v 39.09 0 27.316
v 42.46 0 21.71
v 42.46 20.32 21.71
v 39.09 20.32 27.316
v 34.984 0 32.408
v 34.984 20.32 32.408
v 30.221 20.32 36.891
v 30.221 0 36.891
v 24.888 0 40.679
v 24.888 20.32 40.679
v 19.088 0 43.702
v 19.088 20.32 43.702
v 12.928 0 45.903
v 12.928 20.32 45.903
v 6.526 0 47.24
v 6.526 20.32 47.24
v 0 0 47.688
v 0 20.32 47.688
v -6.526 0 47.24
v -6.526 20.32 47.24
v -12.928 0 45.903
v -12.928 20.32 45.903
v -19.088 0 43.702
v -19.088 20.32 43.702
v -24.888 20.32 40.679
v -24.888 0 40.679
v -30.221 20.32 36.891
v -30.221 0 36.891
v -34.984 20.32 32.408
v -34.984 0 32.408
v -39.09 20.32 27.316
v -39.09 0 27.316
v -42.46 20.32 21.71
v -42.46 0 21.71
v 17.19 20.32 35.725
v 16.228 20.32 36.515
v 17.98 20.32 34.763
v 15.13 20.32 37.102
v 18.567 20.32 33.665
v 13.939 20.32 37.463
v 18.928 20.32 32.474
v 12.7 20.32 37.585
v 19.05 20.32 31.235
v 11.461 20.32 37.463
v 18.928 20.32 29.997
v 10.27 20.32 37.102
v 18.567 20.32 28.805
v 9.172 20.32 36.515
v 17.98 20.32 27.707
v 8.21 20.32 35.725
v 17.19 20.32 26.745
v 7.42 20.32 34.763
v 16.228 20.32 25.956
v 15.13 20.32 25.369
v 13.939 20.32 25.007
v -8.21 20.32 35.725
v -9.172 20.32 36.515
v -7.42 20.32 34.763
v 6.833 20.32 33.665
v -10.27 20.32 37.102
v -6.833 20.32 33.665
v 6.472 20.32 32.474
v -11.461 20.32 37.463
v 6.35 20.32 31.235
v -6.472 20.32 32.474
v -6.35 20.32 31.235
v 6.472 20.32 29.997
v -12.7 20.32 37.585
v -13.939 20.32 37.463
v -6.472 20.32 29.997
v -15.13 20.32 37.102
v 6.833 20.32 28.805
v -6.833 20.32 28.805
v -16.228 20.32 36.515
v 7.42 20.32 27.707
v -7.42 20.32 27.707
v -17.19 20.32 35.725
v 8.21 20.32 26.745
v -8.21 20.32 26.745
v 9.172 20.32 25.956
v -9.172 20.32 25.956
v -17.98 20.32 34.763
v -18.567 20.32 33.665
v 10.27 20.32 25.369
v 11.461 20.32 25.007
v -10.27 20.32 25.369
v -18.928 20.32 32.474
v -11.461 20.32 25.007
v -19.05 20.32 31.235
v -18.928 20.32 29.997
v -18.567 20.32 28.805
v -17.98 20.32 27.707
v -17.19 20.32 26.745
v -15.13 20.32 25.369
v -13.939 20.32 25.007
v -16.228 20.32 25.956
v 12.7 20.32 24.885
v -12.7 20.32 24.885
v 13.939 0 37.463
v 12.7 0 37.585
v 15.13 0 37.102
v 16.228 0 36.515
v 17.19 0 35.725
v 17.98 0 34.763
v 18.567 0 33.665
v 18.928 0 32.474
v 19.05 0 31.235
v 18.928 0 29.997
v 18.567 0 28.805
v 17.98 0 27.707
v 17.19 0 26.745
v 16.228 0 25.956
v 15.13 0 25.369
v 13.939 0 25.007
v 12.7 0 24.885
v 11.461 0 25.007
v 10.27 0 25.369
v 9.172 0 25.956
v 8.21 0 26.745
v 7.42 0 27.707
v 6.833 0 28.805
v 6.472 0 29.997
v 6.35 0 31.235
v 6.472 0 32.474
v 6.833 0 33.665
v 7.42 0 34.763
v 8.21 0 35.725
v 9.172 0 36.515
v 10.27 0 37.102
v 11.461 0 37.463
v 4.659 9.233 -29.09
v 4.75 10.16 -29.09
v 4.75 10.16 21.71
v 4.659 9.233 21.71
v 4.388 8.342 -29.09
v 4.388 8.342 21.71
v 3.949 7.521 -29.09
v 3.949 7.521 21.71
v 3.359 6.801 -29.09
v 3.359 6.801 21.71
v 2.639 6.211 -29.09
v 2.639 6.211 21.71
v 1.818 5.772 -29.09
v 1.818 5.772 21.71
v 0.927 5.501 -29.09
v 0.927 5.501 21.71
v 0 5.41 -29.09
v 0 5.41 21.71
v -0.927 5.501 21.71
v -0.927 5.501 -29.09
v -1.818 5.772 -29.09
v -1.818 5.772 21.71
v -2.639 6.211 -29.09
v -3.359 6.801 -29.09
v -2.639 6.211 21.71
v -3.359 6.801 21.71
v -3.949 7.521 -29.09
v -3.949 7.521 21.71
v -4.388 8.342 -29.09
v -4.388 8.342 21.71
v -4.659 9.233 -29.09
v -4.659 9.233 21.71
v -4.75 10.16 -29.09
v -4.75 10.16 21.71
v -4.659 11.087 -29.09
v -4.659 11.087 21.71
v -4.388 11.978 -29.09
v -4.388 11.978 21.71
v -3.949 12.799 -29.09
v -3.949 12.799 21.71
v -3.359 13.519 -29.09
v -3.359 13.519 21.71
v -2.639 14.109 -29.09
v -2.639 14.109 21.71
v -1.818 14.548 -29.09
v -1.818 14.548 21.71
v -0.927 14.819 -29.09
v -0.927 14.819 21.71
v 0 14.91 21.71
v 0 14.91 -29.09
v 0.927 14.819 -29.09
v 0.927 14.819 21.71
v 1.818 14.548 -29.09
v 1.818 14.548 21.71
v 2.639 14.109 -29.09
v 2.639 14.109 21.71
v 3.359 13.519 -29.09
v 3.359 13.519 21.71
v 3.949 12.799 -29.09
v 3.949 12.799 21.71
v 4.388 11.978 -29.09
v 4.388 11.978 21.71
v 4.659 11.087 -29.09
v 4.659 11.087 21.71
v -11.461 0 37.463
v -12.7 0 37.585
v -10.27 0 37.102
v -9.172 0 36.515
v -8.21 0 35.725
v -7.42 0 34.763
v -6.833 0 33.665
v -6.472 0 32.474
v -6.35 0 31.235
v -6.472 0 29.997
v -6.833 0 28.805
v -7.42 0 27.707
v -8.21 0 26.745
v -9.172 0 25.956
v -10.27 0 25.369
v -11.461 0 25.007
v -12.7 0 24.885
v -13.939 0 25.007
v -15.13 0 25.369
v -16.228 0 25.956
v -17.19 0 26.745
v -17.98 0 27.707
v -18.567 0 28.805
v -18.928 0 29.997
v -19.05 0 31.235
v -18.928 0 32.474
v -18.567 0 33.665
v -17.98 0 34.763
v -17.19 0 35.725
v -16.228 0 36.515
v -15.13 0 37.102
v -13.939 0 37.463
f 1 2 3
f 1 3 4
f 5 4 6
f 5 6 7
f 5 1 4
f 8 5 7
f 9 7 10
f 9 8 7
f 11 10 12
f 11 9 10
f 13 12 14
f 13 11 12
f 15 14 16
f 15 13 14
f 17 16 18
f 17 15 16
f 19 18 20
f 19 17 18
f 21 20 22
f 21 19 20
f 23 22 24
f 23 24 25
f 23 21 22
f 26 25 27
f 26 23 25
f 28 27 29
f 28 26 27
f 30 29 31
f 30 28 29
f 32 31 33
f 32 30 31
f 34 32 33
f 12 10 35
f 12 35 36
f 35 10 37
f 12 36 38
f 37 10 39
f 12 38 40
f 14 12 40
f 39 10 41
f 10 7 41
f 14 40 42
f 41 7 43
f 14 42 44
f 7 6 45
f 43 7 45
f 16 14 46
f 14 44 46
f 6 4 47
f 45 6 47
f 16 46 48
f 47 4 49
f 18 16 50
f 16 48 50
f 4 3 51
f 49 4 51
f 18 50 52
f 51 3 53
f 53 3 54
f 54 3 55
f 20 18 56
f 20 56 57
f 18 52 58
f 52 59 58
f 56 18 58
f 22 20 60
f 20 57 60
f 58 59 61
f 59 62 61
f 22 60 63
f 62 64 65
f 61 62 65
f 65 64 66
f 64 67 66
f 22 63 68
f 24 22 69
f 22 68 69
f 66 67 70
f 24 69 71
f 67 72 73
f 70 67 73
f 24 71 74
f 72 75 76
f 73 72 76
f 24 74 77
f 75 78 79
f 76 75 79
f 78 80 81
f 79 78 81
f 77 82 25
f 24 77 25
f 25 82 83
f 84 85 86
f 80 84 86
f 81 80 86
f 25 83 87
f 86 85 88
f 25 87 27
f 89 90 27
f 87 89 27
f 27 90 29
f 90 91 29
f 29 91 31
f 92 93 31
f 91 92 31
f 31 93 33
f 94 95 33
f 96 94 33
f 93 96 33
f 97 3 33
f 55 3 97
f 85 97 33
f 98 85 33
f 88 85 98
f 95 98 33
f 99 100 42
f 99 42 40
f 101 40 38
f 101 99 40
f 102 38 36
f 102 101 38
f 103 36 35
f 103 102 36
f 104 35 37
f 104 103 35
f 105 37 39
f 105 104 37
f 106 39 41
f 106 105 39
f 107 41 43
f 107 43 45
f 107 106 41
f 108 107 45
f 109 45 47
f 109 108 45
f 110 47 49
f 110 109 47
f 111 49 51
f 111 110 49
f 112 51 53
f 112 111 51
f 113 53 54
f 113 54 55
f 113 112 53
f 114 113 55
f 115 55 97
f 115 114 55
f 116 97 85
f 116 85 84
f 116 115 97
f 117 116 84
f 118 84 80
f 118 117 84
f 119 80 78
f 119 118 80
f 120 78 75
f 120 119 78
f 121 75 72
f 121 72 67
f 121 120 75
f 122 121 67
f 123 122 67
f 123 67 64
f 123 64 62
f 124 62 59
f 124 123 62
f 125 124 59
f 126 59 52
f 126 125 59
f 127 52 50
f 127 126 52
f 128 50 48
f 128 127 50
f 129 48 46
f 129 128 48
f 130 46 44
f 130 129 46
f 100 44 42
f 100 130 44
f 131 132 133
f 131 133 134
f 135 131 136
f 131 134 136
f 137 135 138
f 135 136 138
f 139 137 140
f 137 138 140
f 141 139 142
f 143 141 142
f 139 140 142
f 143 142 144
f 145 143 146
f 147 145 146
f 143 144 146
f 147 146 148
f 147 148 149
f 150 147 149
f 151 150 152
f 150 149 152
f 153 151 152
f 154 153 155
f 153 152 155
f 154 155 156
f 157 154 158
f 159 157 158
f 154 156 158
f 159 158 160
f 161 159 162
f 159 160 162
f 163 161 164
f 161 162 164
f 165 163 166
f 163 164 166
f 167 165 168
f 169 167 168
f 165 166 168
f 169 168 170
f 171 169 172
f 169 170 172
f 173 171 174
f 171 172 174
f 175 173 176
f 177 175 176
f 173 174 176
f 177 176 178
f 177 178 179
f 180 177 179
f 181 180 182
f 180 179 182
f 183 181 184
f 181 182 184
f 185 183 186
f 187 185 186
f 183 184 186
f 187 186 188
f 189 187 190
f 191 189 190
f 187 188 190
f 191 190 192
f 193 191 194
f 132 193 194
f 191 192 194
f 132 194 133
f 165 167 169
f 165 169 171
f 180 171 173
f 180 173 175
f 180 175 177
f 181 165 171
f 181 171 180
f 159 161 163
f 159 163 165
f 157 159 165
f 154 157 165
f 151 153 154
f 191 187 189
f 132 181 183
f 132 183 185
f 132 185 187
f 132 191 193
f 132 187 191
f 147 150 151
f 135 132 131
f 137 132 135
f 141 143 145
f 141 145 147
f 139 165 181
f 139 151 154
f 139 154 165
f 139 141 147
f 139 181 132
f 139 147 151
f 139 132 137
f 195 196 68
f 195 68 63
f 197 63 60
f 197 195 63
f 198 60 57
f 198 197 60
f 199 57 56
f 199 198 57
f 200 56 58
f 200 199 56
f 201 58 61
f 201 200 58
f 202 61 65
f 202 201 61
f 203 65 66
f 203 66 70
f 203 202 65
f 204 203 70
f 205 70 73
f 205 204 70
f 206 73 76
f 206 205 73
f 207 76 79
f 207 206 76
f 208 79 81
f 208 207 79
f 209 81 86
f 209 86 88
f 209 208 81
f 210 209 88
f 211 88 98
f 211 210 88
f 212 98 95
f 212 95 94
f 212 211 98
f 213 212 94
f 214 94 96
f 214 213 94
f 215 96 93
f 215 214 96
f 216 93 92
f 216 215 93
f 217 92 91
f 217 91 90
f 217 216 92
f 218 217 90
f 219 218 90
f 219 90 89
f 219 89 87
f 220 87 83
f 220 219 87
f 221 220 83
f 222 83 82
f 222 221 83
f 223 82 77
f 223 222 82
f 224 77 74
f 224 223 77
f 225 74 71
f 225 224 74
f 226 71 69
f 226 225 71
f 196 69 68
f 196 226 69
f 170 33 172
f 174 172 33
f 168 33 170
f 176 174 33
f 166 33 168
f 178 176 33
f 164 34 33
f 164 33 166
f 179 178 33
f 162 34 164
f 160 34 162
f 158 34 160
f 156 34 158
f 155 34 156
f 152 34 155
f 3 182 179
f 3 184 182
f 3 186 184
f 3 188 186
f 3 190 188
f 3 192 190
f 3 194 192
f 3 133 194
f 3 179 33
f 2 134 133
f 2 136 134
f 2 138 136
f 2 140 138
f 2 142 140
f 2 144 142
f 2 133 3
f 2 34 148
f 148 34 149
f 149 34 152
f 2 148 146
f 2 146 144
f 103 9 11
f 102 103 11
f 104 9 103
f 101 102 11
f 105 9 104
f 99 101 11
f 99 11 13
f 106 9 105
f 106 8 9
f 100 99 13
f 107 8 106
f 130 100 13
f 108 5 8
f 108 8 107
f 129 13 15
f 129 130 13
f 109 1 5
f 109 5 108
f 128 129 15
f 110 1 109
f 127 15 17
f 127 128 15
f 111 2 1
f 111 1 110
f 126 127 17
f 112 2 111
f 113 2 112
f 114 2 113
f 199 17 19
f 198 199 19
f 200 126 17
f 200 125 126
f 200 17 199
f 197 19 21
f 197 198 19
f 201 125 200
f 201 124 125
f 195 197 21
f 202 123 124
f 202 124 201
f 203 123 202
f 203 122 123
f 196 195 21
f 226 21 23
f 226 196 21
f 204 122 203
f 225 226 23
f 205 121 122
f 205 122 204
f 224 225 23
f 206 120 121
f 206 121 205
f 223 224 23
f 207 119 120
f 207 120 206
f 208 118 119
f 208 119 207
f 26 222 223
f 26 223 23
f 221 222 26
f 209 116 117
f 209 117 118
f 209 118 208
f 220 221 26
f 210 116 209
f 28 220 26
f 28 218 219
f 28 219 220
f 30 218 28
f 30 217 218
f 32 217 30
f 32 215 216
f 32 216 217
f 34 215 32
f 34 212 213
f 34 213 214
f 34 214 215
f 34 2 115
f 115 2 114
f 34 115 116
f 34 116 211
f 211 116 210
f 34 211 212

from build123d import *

# Parameters (mm, degrees)
SKETCH1_R           = 6.35
BOSS_EXTRUDE1_DEPTH = 20.32
SKETCH2_R           = 4.7498
BOSS_EXTRUDE2_DEPTH = 50.8


with BuildPart() as part:
    # Sketch1 → Boss-Extrude1 (new body)
    with BuildSketch(Plane(origin=(0, 0, 0), x_dir=(1, 0, 0), z_dir=(0, 1, 0))):
        with BuildLine():
            Line((-42.460023894, -21.710352443), (42.460023894, -21.710352443))
            ThreePointArc((42.460023894, -21.710352443), (0, -47.6885), (-42.460023894, -21.710352443))
        make_face()
        with Locations(Location((-12.7, -31.235352443, 0), (0, 0, 270))):
            Circle(SKETCH1_R, mode=Mode.SUBTRACT)
        with Locations(Location((12.7, -31.235352443, 0), (0, 0, 270))):
            Circle(SKETCH1_R, mode=Mode.SUBTRACT)
    extrude(amount=BOSS_EXTRUDE1_DEPTH)

    # Sketch2 → Boss-Extrude2 (add)
    with BuildSketch(Plane(origin=(0, 0, 21.710352443), x_dir=(-1, 0, 0), z_dir=(0, 0, -1))):
        with Locations(Location((0, 10.16, 0), (0, 0, 180))):
            Circle(SKETCH2_R)
    extrude(amount=BOSS_EXTRUDE2_DEPTH)


solid = part.part
